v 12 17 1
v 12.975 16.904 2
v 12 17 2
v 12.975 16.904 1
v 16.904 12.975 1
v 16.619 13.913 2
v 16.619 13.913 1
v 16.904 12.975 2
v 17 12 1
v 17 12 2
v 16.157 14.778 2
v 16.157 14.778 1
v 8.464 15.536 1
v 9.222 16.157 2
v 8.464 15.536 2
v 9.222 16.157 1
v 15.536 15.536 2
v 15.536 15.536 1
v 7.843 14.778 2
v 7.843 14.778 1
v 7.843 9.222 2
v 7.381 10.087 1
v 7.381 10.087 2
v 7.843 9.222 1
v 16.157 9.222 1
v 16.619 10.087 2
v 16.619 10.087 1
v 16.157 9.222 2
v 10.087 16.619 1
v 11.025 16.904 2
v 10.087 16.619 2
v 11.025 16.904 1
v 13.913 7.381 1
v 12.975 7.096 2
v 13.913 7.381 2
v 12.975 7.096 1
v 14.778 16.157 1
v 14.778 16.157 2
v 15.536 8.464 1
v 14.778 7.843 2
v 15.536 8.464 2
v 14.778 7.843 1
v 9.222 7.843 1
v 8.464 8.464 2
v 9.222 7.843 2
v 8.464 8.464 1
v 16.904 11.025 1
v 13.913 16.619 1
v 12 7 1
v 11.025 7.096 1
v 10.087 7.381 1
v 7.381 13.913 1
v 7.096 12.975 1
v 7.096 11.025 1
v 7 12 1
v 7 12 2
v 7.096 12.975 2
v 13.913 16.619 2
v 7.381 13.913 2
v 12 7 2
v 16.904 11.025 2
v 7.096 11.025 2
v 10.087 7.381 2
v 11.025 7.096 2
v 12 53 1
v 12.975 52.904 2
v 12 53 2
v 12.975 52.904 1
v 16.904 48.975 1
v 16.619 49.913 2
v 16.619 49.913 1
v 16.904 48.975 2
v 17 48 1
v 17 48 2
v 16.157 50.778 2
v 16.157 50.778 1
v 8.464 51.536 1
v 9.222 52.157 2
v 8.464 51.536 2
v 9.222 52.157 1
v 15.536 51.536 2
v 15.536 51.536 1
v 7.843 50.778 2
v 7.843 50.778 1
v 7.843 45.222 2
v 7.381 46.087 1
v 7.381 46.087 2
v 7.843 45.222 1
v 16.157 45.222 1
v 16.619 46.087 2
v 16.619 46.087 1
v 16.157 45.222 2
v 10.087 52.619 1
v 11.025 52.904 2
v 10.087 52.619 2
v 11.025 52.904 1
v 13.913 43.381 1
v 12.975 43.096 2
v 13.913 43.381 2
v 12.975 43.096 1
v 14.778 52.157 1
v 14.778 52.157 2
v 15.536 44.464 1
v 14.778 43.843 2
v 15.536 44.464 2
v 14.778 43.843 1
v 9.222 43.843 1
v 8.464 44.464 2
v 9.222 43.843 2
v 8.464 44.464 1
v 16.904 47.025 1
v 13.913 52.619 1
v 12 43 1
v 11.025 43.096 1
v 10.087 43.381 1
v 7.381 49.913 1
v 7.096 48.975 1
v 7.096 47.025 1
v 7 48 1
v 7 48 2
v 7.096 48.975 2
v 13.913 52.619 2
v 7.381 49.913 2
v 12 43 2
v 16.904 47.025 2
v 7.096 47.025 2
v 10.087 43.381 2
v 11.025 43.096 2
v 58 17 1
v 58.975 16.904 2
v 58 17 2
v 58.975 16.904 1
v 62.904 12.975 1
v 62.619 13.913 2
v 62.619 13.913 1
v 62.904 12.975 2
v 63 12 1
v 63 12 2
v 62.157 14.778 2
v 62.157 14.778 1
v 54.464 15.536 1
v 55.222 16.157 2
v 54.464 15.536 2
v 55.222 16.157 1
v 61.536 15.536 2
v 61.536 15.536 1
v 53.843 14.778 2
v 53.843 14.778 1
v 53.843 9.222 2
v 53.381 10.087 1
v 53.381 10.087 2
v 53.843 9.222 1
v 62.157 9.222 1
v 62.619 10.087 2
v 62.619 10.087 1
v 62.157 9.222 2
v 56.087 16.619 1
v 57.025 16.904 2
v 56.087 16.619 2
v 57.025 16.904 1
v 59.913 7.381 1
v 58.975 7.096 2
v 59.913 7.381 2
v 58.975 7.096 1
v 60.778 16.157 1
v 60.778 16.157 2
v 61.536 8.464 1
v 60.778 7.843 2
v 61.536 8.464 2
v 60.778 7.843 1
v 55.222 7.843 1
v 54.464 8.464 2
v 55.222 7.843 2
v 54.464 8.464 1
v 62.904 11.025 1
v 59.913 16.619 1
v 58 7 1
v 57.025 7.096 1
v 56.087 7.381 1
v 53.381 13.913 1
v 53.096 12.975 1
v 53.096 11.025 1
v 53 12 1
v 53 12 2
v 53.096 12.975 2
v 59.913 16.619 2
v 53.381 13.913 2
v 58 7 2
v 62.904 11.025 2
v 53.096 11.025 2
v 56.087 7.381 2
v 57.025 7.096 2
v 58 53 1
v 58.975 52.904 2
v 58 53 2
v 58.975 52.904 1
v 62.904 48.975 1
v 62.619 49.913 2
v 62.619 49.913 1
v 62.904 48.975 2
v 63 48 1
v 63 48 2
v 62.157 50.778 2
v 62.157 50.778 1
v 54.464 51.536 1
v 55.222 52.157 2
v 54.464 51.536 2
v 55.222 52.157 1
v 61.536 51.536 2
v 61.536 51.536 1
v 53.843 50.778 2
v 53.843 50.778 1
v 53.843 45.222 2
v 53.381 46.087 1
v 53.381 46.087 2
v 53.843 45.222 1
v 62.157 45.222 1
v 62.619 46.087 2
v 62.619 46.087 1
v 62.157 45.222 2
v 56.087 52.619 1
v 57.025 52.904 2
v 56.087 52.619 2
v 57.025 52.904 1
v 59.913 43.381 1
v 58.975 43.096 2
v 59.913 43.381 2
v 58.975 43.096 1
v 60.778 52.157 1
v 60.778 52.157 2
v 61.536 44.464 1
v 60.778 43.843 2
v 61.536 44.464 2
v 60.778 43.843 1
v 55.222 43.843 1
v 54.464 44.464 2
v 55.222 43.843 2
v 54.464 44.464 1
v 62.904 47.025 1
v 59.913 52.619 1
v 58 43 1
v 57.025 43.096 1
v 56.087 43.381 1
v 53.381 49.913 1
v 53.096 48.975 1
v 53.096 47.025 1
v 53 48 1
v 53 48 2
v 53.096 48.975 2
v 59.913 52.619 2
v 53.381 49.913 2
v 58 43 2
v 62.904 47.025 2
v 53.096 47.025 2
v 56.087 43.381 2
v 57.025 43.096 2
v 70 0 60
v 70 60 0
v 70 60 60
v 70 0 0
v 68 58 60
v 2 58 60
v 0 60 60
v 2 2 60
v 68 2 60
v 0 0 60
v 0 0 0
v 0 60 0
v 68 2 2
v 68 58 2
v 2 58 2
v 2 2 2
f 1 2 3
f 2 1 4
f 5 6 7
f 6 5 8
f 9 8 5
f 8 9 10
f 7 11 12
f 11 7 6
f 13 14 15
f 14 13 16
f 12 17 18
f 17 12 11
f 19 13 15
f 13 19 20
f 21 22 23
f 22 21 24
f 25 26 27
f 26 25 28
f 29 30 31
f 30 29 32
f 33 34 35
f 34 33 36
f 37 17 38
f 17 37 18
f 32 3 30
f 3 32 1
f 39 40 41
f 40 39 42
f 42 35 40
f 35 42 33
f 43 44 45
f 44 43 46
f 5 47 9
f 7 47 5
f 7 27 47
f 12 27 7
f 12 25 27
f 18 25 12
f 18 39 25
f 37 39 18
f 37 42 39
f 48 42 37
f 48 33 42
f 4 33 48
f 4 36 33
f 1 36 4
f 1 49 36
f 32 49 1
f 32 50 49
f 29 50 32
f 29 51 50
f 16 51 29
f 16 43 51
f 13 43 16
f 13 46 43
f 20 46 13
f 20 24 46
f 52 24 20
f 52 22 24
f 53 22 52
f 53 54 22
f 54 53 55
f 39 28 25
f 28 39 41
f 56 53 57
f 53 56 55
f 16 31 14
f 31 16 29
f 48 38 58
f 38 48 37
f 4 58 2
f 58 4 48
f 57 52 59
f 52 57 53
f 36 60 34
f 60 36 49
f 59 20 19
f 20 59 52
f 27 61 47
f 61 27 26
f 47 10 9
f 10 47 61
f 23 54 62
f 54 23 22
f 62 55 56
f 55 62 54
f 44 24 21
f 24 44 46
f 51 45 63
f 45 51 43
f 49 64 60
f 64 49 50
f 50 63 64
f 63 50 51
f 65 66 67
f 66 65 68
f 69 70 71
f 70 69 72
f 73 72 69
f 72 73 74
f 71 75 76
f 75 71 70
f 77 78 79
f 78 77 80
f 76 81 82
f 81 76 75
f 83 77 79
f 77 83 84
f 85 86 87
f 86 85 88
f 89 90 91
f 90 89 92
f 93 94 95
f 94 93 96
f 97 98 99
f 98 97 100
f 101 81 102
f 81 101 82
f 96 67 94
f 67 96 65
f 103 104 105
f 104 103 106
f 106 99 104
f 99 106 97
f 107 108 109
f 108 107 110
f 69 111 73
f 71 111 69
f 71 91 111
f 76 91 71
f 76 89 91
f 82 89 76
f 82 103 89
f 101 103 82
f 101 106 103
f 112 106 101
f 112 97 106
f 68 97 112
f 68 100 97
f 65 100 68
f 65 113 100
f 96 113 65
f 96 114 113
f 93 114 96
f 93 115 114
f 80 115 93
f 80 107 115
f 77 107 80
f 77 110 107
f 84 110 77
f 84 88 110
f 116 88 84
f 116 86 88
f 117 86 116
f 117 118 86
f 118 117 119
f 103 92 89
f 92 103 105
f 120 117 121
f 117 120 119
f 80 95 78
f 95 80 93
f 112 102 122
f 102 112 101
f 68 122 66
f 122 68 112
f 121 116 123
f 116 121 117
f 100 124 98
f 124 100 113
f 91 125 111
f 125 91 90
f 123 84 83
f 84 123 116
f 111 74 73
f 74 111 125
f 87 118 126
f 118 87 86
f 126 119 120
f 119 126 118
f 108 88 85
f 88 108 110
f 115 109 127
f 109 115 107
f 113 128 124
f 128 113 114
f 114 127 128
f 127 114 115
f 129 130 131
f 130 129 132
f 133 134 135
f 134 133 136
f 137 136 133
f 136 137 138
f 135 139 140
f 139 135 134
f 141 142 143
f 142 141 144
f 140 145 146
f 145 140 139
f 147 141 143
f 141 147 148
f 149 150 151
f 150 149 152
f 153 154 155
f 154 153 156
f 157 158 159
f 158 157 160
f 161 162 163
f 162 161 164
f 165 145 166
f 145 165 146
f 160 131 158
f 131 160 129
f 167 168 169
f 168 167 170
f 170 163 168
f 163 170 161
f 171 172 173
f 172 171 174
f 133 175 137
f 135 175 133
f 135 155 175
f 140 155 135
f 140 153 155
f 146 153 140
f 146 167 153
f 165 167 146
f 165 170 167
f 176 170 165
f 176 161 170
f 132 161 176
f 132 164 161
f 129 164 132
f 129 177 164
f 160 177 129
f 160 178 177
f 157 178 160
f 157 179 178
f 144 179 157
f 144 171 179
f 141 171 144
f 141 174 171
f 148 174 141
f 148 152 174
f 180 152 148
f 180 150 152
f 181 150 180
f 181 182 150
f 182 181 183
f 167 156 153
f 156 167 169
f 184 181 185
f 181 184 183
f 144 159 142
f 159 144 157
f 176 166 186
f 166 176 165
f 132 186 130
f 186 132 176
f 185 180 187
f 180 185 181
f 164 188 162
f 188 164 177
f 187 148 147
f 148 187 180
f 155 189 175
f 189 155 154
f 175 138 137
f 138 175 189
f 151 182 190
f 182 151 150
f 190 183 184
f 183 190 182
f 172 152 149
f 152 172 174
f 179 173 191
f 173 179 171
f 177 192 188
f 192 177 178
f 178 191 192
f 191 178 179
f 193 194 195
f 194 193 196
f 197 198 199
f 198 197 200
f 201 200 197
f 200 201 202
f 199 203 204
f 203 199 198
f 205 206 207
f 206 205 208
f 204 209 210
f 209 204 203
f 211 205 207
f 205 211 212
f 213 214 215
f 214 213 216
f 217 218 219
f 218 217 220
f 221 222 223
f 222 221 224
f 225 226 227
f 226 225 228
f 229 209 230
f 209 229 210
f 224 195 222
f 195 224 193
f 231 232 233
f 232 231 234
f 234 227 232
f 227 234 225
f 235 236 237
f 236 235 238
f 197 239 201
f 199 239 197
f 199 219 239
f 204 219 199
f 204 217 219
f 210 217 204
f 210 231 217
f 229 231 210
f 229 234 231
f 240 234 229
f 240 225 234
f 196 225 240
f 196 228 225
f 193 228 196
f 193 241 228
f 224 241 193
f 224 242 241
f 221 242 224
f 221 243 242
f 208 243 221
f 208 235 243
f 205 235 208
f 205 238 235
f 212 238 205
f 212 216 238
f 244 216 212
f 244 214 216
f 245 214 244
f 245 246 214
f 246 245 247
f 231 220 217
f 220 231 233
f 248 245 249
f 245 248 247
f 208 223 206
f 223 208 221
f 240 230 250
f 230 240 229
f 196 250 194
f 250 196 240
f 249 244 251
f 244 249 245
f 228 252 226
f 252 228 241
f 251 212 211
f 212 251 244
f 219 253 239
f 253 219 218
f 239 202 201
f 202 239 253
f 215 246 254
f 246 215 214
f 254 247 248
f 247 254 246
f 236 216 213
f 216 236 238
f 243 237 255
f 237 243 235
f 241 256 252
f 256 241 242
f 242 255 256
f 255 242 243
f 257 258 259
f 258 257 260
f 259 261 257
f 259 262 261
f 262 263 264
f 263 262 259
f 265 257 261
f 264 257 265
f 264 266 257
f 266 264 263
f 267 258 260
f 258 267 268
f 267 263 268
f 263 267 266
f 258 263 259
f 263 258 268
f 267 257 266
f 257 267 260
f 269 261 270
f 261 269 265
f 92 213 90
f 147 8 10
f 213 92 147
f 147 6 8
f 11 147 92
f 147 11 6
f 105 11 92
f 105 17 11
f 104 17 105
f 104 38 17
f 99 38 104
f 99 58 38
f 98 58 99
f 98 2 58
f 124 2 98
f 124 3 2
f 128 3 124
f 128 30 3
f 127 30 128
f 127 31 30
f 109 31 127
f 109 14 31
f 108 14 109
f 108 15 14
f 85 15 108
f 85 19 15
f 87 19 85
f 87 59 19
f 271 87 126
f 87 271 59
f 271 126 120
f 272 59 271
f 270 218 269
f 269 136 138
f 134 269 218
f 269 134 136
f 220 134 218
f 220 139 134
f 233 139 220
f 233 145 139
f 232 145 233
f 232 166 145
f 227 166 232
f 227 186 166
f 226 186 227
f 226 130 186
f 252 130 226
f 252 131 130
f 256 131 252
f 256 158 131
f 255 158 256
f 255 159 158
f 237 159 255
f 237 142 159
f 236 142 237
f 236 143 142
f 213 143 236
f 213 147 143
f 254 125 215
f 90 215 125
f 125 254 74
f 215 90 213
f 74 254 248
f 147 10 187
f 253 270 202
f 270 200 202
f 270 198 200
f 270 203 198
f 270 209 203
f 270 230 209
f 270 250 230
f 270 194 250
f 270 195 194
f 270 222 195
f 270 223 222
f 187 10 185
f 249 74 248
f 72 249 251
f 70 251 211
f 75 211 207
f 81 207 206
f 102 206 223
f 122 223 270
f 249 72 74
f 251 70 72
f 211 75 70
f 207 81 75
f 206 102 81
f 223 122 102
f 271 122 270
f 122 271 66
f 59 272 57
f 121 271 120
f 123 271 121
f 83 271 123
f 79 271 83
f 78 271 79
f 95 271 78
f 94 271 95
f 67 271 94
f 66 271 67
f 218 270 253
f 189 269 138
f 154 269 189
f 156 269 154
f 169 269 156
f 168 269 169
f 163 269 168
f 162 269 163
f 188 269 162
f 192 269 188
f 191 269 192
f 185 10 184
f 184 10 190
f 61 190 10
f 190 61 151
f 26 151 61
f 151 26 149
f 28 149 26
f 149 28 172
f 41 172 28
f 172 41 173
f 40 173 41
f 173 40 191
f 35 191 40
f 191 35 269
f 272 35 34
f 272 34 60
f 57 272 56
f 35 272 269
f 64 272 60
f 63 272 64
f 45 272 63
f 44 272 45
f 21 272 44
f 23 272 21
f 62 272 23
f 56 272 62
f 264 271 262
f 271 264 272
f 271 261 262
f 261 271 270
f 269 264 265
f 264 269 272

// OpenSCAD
$fn = 32;

// ----------------------------------------------------------------------
// Enclosure box: bosses enclosure
// ----------------------------------------------------------------------

// --- parameters (mm) ---
box_l = 70;               // outer length, X
box_w = 60;               // outer width, Y
box_h = 60;               // outer height
wall_t = 2;               // wall thickness
boss_r = 5;               // corner boss radius
hole_r = 1.5;             // boss screw hole radius
boss_in = 12;             // boss inset from the corners

inner_h = box_h - wall_t;  // cavity depth
boss_h = inner_h - 2;  // corner boss height

difference() {
  cube([box_l, box_w, box_h]);
  translate([wall_t, wall_t, wall_t])
    cube([box_l - 2 * wall_t, box_w - 2 * wall_t, box_h]);
  for (sx = [0, 1], sy = [0, 1])
    translate([sx ? box_l - boss_in : boss_in,
               sy ? box_w - boss_in : boss_in, wall_t - 1]) {
      cylinder(r = boss_r, h = boss_h);
      translate([0, 0, boss_h - 4])
        cylinder(r = hole_r, h = 5);
    }
}
